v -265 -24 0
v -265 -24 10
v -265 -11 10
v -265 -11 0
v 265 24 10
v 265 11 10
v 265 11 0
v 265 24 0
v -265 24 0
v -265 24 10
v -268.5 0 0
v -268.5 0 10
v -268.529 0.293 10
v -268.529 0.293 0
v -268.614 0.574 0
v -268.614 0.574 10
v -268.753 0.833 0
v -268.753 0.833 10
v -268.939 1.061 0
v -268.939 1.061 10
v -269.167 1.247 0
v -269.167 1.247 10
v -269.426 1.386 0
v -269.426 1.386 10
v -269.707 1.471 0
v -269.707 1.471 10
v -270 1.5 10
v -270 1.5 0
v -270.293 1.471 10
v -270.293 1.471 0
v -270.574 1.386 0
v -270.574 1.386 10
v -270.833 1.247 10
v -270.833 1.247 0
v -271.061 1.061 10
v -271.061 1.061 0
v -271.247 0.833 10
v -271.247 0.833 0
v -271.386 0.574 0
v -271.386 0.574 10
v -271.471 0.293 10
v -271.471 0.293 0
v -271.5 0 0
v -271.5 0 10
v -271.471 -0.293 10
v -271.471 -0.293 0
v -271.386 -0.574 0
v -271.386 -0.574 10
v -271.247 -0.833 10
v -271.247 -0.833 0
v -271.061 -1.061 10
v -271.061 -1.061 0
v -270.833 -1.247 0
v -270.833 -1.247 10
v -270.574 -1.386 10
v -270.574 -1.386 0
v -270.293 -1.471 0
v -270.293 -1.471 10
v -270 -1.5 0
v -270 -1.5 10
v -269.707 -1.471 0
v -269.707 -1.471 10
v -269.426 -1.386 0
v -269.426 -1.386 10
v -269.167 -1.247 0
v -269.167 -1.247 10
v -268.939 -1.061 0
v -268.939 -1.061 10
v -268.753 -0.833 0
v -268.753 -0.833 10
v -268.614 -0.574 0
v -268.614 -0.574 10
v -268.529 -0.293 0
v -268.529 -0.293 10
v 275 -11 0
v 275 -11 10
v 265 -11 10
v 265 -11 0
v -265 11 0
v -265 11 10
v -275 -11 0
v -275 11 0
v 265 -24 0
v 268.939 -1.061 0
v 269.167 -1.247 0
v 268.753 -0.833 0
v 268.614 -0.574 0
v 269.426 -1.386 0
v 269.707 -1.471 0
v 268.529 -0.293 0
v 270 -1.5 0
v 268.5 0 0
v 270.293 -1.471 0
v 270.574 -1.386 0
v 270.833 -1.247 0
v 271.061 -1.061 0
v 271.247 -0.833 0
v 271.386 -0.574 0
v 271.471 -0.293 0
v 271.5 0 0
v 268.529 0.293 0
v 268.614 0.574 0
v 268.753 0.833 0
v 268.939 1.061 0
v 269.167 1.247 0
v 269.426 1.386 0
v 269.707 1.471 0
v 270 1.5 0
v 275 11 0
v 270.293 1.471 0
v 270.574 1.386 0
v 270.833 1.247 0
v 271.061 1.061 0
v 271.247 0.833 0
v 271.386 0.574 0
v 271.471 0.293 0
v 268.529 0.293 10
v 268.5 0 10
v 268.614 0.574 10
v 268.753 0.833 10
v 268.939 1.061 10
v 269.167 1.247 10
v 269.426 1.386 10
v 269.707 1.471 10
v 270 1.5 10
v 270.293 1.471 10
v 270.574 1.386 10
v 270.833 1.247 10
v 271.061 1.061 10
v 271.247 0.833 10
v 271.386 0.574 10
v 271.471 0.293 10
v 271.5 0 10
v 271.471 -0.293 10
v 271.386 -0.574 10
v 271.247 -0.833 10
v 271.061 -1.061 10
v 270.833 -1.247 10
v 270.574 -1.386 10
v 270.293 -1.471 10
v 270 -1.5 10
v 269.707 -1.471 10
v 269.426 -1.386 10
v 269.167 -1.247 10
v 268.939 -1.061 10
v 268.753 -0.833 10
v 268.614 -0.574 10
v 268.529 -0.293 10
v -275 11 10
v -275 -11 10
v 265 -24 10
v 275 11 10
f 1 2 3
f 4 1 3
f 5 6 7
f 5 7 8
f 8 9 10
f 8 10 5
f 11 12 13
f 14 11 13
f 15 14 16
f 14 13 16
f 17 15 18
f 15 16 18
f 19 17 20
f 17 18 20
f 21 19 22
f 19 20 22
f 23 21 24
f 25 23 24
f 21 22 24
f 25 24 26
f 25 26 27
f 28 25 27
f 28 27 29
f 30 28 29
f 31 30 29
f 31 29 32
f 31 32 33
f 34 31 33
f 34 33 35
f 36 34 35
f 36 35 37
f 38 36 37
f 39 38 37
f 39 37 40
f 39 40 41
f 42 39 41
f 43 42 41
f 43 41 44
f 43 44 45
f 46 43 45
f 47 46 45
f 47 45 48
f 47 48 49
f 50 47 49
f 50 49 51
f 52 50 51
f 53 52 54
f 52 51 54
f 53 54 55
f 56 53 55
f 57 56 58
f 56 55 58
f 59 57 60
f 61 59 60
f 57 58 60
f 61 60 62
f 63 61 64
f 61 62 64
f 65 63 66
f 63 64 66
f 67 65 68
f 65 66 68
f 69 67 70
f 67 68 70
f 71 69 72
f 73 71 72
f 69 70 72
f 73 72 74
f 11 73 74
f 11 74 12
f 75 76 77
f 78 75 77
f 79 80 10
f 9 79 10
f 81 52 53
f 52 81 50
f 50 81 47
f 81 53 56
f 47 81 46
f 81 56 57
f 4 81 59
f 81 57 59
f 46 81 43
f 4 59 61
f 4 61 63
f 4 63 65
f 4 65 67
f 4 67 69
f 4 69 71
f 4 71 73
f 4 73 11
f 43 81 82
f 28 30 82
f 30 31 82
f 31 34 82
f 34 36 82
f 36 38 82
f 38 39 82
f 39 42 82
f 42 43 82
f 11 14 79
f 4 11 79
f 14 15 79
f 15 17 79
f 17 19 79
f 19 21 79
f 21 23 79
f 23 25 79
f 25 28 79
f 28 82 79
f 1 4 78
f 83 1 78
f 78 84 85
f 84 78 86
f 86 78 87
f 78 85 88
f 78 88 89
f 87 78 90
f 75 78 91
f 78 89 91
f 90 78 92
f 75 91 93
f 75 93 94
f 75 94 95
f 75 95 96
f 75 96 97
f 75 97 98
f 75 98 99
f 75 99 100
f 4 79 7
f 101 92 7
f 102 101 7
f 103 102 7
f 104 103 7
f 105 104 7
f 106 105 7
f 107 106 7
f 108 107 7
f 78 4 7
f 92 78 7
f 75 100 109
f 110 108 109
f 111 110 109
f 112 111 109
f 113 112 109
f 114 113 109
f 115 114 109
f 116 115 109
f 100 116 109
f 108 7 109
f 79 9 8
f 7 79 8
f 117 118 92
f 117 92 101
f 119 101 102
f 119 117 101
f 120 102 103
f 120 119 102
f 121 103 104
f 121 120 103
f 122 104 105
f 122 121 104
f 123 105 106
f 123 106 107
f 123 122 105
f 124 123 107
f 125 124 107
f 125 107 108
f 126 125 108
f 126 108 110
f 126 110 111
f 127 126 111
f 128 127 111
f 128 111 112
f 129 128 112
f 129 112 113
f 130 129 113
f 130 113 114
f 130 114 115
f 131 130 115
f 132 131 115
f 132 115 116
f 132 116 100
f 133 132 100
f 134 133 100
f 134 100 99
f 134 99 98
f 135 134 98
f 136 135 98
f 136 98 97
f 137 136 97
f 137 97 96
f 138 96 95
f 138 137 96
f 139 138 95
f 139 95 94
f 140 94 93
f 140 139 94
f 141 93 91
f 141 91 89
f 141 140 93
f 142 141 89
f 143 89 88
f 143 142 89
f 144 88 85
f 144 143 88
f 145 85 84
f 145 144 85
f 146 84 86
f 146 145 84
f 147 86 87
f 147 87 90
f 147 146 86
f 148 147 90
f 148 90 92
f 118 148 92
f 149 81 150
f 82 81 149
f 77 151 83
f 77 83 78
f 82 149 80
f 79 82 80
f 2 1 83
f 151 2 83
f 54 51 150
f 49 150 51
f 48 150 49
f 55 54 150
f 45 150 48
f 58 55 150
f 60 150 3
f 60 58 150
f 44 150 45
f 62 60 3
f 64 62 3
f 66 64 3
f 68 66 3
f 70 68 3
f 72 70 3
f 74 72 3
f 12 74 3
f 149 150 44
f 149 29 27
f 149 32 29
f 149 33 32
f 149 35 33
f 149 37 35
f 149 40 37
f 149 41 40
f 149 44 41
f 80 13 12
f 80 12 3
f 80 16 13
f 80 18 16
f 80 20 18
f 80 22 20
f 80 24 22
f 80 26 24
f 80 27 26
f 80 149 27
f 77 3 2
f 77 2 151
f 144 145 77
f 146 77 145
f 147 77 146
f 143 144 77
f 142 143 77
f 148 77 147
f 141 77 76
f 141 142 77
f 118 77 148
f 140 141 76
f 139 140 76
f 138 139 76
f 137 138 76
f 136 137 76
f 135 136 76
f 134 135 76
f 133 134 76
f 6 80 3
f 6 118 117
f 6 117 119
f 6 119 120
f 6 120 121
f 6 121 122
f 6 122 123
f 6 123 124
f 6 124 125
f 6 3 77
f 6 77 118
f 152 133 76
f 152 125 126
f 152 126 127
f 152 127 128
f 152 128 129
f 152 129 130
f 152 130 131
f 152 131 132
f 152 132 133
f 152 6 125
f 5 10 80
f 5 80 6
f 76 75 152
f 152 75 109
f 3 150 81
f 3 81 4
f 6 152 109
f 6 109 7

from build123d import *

# Parameters (mm, degrees)
SKETCH1_W             = 550
SKETCH1_H             = 48
EXTRUDE_361_DEPTH     = 10
CUT_EXTRUDE_622_REACH = 278.226
SKETCH2_W             = 10
SKETCH2_H             = 13
CUT_EXTRUDE_942_REACH = 278.226
SKETCH3_R             = 1.5


with BuildPart() as part:
    # Sketch1 → Extrude 361 (new body)
    with BuildSketch(Plane.XY):
        Rectangle(SKETCH1_W, SKETCH1_H)
    extrude(amount=EXTRUDE_361_DEPTH)

    # Sketch2 → Cut-Extrude 622 (cut, up to next)
    with BuildSketch(Plane.XY.offset(10), mode=Mode.PRIVATE) as cut_extrude_622_sk1:
        with Locations((-270, -17.5)):
            Rectangle(SKETCH2_W, SKETCH2_H)
    cut_extrude_622_tool1 = extrude(cut_extrude_622_sk1.sketch, amount=-CUT_EXTRUDE_622_REACH, mode=Mode.PRIVATE) & part.part
    # Sketch2 → Cut-Extrude 622 (cut, up to next)
    with BuildSketch(Plane.XY.offset(10), mode=Mode.PRIVATE) as cut_extrude_622_sk2:
        with Locations((-270, 17.5)):
            Rectangle(SKETCH2_W, SKETCH2_H)
    cut_extrude_622_tool2 = extrude(cut_extrude_622_sk2.sketch, amount=-CUT_EXTRUDE_622_REACH, mode=Mode.PRIVATE) & part.part
    cut_extrude_622_1 = cut_extrude_622_tool1.solids().sort_by_distance((-270, -17.5, 10))[0]
    add(cut_extrude_622_1, mode=Mode.SUBTRACT)
    cut_extrude_622_2 = cut_extrude_622_tool2.solids().sort_by_distance((-270, 17.5, 10))[0]
    add(cut_extrude_622_2, mode=Mode.SUBTRACT)
    cut_extrude_622 = cut_extrude_622_1 + cut_extrude_622_2  # Cut-Extrude 622 as one shape, for the pattern or mirror that repeats it

    # Sketch3 → Cut-Extrude 942 (cut, up to next)
    with BuildSketch(Plane.XY.offset(10), mode=Mode.PRIVATE) as cut_extrude_942_sk1:
        with Locations((-270, 0)):
            Circle(SKETCH3_R)
    cut_extrude_942_tool1 = extrude(cut_extrude_942_sk1.sketch, amount=-CUT_EXTRUDE_942_REACH, mode=Mode.PRIVATE) & part.part
    cut_extrude_942 = cut_extrude_942_tool1.solids().sort_by_distance((-270, 0, 10))[0]
    add(cut_extrude_942, mode=Mode.SUBTRACT)

    # Mirror1: Cut-Extrude 622, Cut-Extrude 942 across plane
    add(cut_extrude_622.mirror(Plane(origin=(0, 0, 0), x_dir=(0, 0, 1), z_dir=(1, 0, 0))), mode=Mode.SUBTRACT)
    add(cut_extrude_942.mirror(Plane(origin=(0, 0, 0), x_dir=(0, 0, 1), z_dir=(1, 0, 0))), mode=Mode.SUBTRACT)


solid = part.part
